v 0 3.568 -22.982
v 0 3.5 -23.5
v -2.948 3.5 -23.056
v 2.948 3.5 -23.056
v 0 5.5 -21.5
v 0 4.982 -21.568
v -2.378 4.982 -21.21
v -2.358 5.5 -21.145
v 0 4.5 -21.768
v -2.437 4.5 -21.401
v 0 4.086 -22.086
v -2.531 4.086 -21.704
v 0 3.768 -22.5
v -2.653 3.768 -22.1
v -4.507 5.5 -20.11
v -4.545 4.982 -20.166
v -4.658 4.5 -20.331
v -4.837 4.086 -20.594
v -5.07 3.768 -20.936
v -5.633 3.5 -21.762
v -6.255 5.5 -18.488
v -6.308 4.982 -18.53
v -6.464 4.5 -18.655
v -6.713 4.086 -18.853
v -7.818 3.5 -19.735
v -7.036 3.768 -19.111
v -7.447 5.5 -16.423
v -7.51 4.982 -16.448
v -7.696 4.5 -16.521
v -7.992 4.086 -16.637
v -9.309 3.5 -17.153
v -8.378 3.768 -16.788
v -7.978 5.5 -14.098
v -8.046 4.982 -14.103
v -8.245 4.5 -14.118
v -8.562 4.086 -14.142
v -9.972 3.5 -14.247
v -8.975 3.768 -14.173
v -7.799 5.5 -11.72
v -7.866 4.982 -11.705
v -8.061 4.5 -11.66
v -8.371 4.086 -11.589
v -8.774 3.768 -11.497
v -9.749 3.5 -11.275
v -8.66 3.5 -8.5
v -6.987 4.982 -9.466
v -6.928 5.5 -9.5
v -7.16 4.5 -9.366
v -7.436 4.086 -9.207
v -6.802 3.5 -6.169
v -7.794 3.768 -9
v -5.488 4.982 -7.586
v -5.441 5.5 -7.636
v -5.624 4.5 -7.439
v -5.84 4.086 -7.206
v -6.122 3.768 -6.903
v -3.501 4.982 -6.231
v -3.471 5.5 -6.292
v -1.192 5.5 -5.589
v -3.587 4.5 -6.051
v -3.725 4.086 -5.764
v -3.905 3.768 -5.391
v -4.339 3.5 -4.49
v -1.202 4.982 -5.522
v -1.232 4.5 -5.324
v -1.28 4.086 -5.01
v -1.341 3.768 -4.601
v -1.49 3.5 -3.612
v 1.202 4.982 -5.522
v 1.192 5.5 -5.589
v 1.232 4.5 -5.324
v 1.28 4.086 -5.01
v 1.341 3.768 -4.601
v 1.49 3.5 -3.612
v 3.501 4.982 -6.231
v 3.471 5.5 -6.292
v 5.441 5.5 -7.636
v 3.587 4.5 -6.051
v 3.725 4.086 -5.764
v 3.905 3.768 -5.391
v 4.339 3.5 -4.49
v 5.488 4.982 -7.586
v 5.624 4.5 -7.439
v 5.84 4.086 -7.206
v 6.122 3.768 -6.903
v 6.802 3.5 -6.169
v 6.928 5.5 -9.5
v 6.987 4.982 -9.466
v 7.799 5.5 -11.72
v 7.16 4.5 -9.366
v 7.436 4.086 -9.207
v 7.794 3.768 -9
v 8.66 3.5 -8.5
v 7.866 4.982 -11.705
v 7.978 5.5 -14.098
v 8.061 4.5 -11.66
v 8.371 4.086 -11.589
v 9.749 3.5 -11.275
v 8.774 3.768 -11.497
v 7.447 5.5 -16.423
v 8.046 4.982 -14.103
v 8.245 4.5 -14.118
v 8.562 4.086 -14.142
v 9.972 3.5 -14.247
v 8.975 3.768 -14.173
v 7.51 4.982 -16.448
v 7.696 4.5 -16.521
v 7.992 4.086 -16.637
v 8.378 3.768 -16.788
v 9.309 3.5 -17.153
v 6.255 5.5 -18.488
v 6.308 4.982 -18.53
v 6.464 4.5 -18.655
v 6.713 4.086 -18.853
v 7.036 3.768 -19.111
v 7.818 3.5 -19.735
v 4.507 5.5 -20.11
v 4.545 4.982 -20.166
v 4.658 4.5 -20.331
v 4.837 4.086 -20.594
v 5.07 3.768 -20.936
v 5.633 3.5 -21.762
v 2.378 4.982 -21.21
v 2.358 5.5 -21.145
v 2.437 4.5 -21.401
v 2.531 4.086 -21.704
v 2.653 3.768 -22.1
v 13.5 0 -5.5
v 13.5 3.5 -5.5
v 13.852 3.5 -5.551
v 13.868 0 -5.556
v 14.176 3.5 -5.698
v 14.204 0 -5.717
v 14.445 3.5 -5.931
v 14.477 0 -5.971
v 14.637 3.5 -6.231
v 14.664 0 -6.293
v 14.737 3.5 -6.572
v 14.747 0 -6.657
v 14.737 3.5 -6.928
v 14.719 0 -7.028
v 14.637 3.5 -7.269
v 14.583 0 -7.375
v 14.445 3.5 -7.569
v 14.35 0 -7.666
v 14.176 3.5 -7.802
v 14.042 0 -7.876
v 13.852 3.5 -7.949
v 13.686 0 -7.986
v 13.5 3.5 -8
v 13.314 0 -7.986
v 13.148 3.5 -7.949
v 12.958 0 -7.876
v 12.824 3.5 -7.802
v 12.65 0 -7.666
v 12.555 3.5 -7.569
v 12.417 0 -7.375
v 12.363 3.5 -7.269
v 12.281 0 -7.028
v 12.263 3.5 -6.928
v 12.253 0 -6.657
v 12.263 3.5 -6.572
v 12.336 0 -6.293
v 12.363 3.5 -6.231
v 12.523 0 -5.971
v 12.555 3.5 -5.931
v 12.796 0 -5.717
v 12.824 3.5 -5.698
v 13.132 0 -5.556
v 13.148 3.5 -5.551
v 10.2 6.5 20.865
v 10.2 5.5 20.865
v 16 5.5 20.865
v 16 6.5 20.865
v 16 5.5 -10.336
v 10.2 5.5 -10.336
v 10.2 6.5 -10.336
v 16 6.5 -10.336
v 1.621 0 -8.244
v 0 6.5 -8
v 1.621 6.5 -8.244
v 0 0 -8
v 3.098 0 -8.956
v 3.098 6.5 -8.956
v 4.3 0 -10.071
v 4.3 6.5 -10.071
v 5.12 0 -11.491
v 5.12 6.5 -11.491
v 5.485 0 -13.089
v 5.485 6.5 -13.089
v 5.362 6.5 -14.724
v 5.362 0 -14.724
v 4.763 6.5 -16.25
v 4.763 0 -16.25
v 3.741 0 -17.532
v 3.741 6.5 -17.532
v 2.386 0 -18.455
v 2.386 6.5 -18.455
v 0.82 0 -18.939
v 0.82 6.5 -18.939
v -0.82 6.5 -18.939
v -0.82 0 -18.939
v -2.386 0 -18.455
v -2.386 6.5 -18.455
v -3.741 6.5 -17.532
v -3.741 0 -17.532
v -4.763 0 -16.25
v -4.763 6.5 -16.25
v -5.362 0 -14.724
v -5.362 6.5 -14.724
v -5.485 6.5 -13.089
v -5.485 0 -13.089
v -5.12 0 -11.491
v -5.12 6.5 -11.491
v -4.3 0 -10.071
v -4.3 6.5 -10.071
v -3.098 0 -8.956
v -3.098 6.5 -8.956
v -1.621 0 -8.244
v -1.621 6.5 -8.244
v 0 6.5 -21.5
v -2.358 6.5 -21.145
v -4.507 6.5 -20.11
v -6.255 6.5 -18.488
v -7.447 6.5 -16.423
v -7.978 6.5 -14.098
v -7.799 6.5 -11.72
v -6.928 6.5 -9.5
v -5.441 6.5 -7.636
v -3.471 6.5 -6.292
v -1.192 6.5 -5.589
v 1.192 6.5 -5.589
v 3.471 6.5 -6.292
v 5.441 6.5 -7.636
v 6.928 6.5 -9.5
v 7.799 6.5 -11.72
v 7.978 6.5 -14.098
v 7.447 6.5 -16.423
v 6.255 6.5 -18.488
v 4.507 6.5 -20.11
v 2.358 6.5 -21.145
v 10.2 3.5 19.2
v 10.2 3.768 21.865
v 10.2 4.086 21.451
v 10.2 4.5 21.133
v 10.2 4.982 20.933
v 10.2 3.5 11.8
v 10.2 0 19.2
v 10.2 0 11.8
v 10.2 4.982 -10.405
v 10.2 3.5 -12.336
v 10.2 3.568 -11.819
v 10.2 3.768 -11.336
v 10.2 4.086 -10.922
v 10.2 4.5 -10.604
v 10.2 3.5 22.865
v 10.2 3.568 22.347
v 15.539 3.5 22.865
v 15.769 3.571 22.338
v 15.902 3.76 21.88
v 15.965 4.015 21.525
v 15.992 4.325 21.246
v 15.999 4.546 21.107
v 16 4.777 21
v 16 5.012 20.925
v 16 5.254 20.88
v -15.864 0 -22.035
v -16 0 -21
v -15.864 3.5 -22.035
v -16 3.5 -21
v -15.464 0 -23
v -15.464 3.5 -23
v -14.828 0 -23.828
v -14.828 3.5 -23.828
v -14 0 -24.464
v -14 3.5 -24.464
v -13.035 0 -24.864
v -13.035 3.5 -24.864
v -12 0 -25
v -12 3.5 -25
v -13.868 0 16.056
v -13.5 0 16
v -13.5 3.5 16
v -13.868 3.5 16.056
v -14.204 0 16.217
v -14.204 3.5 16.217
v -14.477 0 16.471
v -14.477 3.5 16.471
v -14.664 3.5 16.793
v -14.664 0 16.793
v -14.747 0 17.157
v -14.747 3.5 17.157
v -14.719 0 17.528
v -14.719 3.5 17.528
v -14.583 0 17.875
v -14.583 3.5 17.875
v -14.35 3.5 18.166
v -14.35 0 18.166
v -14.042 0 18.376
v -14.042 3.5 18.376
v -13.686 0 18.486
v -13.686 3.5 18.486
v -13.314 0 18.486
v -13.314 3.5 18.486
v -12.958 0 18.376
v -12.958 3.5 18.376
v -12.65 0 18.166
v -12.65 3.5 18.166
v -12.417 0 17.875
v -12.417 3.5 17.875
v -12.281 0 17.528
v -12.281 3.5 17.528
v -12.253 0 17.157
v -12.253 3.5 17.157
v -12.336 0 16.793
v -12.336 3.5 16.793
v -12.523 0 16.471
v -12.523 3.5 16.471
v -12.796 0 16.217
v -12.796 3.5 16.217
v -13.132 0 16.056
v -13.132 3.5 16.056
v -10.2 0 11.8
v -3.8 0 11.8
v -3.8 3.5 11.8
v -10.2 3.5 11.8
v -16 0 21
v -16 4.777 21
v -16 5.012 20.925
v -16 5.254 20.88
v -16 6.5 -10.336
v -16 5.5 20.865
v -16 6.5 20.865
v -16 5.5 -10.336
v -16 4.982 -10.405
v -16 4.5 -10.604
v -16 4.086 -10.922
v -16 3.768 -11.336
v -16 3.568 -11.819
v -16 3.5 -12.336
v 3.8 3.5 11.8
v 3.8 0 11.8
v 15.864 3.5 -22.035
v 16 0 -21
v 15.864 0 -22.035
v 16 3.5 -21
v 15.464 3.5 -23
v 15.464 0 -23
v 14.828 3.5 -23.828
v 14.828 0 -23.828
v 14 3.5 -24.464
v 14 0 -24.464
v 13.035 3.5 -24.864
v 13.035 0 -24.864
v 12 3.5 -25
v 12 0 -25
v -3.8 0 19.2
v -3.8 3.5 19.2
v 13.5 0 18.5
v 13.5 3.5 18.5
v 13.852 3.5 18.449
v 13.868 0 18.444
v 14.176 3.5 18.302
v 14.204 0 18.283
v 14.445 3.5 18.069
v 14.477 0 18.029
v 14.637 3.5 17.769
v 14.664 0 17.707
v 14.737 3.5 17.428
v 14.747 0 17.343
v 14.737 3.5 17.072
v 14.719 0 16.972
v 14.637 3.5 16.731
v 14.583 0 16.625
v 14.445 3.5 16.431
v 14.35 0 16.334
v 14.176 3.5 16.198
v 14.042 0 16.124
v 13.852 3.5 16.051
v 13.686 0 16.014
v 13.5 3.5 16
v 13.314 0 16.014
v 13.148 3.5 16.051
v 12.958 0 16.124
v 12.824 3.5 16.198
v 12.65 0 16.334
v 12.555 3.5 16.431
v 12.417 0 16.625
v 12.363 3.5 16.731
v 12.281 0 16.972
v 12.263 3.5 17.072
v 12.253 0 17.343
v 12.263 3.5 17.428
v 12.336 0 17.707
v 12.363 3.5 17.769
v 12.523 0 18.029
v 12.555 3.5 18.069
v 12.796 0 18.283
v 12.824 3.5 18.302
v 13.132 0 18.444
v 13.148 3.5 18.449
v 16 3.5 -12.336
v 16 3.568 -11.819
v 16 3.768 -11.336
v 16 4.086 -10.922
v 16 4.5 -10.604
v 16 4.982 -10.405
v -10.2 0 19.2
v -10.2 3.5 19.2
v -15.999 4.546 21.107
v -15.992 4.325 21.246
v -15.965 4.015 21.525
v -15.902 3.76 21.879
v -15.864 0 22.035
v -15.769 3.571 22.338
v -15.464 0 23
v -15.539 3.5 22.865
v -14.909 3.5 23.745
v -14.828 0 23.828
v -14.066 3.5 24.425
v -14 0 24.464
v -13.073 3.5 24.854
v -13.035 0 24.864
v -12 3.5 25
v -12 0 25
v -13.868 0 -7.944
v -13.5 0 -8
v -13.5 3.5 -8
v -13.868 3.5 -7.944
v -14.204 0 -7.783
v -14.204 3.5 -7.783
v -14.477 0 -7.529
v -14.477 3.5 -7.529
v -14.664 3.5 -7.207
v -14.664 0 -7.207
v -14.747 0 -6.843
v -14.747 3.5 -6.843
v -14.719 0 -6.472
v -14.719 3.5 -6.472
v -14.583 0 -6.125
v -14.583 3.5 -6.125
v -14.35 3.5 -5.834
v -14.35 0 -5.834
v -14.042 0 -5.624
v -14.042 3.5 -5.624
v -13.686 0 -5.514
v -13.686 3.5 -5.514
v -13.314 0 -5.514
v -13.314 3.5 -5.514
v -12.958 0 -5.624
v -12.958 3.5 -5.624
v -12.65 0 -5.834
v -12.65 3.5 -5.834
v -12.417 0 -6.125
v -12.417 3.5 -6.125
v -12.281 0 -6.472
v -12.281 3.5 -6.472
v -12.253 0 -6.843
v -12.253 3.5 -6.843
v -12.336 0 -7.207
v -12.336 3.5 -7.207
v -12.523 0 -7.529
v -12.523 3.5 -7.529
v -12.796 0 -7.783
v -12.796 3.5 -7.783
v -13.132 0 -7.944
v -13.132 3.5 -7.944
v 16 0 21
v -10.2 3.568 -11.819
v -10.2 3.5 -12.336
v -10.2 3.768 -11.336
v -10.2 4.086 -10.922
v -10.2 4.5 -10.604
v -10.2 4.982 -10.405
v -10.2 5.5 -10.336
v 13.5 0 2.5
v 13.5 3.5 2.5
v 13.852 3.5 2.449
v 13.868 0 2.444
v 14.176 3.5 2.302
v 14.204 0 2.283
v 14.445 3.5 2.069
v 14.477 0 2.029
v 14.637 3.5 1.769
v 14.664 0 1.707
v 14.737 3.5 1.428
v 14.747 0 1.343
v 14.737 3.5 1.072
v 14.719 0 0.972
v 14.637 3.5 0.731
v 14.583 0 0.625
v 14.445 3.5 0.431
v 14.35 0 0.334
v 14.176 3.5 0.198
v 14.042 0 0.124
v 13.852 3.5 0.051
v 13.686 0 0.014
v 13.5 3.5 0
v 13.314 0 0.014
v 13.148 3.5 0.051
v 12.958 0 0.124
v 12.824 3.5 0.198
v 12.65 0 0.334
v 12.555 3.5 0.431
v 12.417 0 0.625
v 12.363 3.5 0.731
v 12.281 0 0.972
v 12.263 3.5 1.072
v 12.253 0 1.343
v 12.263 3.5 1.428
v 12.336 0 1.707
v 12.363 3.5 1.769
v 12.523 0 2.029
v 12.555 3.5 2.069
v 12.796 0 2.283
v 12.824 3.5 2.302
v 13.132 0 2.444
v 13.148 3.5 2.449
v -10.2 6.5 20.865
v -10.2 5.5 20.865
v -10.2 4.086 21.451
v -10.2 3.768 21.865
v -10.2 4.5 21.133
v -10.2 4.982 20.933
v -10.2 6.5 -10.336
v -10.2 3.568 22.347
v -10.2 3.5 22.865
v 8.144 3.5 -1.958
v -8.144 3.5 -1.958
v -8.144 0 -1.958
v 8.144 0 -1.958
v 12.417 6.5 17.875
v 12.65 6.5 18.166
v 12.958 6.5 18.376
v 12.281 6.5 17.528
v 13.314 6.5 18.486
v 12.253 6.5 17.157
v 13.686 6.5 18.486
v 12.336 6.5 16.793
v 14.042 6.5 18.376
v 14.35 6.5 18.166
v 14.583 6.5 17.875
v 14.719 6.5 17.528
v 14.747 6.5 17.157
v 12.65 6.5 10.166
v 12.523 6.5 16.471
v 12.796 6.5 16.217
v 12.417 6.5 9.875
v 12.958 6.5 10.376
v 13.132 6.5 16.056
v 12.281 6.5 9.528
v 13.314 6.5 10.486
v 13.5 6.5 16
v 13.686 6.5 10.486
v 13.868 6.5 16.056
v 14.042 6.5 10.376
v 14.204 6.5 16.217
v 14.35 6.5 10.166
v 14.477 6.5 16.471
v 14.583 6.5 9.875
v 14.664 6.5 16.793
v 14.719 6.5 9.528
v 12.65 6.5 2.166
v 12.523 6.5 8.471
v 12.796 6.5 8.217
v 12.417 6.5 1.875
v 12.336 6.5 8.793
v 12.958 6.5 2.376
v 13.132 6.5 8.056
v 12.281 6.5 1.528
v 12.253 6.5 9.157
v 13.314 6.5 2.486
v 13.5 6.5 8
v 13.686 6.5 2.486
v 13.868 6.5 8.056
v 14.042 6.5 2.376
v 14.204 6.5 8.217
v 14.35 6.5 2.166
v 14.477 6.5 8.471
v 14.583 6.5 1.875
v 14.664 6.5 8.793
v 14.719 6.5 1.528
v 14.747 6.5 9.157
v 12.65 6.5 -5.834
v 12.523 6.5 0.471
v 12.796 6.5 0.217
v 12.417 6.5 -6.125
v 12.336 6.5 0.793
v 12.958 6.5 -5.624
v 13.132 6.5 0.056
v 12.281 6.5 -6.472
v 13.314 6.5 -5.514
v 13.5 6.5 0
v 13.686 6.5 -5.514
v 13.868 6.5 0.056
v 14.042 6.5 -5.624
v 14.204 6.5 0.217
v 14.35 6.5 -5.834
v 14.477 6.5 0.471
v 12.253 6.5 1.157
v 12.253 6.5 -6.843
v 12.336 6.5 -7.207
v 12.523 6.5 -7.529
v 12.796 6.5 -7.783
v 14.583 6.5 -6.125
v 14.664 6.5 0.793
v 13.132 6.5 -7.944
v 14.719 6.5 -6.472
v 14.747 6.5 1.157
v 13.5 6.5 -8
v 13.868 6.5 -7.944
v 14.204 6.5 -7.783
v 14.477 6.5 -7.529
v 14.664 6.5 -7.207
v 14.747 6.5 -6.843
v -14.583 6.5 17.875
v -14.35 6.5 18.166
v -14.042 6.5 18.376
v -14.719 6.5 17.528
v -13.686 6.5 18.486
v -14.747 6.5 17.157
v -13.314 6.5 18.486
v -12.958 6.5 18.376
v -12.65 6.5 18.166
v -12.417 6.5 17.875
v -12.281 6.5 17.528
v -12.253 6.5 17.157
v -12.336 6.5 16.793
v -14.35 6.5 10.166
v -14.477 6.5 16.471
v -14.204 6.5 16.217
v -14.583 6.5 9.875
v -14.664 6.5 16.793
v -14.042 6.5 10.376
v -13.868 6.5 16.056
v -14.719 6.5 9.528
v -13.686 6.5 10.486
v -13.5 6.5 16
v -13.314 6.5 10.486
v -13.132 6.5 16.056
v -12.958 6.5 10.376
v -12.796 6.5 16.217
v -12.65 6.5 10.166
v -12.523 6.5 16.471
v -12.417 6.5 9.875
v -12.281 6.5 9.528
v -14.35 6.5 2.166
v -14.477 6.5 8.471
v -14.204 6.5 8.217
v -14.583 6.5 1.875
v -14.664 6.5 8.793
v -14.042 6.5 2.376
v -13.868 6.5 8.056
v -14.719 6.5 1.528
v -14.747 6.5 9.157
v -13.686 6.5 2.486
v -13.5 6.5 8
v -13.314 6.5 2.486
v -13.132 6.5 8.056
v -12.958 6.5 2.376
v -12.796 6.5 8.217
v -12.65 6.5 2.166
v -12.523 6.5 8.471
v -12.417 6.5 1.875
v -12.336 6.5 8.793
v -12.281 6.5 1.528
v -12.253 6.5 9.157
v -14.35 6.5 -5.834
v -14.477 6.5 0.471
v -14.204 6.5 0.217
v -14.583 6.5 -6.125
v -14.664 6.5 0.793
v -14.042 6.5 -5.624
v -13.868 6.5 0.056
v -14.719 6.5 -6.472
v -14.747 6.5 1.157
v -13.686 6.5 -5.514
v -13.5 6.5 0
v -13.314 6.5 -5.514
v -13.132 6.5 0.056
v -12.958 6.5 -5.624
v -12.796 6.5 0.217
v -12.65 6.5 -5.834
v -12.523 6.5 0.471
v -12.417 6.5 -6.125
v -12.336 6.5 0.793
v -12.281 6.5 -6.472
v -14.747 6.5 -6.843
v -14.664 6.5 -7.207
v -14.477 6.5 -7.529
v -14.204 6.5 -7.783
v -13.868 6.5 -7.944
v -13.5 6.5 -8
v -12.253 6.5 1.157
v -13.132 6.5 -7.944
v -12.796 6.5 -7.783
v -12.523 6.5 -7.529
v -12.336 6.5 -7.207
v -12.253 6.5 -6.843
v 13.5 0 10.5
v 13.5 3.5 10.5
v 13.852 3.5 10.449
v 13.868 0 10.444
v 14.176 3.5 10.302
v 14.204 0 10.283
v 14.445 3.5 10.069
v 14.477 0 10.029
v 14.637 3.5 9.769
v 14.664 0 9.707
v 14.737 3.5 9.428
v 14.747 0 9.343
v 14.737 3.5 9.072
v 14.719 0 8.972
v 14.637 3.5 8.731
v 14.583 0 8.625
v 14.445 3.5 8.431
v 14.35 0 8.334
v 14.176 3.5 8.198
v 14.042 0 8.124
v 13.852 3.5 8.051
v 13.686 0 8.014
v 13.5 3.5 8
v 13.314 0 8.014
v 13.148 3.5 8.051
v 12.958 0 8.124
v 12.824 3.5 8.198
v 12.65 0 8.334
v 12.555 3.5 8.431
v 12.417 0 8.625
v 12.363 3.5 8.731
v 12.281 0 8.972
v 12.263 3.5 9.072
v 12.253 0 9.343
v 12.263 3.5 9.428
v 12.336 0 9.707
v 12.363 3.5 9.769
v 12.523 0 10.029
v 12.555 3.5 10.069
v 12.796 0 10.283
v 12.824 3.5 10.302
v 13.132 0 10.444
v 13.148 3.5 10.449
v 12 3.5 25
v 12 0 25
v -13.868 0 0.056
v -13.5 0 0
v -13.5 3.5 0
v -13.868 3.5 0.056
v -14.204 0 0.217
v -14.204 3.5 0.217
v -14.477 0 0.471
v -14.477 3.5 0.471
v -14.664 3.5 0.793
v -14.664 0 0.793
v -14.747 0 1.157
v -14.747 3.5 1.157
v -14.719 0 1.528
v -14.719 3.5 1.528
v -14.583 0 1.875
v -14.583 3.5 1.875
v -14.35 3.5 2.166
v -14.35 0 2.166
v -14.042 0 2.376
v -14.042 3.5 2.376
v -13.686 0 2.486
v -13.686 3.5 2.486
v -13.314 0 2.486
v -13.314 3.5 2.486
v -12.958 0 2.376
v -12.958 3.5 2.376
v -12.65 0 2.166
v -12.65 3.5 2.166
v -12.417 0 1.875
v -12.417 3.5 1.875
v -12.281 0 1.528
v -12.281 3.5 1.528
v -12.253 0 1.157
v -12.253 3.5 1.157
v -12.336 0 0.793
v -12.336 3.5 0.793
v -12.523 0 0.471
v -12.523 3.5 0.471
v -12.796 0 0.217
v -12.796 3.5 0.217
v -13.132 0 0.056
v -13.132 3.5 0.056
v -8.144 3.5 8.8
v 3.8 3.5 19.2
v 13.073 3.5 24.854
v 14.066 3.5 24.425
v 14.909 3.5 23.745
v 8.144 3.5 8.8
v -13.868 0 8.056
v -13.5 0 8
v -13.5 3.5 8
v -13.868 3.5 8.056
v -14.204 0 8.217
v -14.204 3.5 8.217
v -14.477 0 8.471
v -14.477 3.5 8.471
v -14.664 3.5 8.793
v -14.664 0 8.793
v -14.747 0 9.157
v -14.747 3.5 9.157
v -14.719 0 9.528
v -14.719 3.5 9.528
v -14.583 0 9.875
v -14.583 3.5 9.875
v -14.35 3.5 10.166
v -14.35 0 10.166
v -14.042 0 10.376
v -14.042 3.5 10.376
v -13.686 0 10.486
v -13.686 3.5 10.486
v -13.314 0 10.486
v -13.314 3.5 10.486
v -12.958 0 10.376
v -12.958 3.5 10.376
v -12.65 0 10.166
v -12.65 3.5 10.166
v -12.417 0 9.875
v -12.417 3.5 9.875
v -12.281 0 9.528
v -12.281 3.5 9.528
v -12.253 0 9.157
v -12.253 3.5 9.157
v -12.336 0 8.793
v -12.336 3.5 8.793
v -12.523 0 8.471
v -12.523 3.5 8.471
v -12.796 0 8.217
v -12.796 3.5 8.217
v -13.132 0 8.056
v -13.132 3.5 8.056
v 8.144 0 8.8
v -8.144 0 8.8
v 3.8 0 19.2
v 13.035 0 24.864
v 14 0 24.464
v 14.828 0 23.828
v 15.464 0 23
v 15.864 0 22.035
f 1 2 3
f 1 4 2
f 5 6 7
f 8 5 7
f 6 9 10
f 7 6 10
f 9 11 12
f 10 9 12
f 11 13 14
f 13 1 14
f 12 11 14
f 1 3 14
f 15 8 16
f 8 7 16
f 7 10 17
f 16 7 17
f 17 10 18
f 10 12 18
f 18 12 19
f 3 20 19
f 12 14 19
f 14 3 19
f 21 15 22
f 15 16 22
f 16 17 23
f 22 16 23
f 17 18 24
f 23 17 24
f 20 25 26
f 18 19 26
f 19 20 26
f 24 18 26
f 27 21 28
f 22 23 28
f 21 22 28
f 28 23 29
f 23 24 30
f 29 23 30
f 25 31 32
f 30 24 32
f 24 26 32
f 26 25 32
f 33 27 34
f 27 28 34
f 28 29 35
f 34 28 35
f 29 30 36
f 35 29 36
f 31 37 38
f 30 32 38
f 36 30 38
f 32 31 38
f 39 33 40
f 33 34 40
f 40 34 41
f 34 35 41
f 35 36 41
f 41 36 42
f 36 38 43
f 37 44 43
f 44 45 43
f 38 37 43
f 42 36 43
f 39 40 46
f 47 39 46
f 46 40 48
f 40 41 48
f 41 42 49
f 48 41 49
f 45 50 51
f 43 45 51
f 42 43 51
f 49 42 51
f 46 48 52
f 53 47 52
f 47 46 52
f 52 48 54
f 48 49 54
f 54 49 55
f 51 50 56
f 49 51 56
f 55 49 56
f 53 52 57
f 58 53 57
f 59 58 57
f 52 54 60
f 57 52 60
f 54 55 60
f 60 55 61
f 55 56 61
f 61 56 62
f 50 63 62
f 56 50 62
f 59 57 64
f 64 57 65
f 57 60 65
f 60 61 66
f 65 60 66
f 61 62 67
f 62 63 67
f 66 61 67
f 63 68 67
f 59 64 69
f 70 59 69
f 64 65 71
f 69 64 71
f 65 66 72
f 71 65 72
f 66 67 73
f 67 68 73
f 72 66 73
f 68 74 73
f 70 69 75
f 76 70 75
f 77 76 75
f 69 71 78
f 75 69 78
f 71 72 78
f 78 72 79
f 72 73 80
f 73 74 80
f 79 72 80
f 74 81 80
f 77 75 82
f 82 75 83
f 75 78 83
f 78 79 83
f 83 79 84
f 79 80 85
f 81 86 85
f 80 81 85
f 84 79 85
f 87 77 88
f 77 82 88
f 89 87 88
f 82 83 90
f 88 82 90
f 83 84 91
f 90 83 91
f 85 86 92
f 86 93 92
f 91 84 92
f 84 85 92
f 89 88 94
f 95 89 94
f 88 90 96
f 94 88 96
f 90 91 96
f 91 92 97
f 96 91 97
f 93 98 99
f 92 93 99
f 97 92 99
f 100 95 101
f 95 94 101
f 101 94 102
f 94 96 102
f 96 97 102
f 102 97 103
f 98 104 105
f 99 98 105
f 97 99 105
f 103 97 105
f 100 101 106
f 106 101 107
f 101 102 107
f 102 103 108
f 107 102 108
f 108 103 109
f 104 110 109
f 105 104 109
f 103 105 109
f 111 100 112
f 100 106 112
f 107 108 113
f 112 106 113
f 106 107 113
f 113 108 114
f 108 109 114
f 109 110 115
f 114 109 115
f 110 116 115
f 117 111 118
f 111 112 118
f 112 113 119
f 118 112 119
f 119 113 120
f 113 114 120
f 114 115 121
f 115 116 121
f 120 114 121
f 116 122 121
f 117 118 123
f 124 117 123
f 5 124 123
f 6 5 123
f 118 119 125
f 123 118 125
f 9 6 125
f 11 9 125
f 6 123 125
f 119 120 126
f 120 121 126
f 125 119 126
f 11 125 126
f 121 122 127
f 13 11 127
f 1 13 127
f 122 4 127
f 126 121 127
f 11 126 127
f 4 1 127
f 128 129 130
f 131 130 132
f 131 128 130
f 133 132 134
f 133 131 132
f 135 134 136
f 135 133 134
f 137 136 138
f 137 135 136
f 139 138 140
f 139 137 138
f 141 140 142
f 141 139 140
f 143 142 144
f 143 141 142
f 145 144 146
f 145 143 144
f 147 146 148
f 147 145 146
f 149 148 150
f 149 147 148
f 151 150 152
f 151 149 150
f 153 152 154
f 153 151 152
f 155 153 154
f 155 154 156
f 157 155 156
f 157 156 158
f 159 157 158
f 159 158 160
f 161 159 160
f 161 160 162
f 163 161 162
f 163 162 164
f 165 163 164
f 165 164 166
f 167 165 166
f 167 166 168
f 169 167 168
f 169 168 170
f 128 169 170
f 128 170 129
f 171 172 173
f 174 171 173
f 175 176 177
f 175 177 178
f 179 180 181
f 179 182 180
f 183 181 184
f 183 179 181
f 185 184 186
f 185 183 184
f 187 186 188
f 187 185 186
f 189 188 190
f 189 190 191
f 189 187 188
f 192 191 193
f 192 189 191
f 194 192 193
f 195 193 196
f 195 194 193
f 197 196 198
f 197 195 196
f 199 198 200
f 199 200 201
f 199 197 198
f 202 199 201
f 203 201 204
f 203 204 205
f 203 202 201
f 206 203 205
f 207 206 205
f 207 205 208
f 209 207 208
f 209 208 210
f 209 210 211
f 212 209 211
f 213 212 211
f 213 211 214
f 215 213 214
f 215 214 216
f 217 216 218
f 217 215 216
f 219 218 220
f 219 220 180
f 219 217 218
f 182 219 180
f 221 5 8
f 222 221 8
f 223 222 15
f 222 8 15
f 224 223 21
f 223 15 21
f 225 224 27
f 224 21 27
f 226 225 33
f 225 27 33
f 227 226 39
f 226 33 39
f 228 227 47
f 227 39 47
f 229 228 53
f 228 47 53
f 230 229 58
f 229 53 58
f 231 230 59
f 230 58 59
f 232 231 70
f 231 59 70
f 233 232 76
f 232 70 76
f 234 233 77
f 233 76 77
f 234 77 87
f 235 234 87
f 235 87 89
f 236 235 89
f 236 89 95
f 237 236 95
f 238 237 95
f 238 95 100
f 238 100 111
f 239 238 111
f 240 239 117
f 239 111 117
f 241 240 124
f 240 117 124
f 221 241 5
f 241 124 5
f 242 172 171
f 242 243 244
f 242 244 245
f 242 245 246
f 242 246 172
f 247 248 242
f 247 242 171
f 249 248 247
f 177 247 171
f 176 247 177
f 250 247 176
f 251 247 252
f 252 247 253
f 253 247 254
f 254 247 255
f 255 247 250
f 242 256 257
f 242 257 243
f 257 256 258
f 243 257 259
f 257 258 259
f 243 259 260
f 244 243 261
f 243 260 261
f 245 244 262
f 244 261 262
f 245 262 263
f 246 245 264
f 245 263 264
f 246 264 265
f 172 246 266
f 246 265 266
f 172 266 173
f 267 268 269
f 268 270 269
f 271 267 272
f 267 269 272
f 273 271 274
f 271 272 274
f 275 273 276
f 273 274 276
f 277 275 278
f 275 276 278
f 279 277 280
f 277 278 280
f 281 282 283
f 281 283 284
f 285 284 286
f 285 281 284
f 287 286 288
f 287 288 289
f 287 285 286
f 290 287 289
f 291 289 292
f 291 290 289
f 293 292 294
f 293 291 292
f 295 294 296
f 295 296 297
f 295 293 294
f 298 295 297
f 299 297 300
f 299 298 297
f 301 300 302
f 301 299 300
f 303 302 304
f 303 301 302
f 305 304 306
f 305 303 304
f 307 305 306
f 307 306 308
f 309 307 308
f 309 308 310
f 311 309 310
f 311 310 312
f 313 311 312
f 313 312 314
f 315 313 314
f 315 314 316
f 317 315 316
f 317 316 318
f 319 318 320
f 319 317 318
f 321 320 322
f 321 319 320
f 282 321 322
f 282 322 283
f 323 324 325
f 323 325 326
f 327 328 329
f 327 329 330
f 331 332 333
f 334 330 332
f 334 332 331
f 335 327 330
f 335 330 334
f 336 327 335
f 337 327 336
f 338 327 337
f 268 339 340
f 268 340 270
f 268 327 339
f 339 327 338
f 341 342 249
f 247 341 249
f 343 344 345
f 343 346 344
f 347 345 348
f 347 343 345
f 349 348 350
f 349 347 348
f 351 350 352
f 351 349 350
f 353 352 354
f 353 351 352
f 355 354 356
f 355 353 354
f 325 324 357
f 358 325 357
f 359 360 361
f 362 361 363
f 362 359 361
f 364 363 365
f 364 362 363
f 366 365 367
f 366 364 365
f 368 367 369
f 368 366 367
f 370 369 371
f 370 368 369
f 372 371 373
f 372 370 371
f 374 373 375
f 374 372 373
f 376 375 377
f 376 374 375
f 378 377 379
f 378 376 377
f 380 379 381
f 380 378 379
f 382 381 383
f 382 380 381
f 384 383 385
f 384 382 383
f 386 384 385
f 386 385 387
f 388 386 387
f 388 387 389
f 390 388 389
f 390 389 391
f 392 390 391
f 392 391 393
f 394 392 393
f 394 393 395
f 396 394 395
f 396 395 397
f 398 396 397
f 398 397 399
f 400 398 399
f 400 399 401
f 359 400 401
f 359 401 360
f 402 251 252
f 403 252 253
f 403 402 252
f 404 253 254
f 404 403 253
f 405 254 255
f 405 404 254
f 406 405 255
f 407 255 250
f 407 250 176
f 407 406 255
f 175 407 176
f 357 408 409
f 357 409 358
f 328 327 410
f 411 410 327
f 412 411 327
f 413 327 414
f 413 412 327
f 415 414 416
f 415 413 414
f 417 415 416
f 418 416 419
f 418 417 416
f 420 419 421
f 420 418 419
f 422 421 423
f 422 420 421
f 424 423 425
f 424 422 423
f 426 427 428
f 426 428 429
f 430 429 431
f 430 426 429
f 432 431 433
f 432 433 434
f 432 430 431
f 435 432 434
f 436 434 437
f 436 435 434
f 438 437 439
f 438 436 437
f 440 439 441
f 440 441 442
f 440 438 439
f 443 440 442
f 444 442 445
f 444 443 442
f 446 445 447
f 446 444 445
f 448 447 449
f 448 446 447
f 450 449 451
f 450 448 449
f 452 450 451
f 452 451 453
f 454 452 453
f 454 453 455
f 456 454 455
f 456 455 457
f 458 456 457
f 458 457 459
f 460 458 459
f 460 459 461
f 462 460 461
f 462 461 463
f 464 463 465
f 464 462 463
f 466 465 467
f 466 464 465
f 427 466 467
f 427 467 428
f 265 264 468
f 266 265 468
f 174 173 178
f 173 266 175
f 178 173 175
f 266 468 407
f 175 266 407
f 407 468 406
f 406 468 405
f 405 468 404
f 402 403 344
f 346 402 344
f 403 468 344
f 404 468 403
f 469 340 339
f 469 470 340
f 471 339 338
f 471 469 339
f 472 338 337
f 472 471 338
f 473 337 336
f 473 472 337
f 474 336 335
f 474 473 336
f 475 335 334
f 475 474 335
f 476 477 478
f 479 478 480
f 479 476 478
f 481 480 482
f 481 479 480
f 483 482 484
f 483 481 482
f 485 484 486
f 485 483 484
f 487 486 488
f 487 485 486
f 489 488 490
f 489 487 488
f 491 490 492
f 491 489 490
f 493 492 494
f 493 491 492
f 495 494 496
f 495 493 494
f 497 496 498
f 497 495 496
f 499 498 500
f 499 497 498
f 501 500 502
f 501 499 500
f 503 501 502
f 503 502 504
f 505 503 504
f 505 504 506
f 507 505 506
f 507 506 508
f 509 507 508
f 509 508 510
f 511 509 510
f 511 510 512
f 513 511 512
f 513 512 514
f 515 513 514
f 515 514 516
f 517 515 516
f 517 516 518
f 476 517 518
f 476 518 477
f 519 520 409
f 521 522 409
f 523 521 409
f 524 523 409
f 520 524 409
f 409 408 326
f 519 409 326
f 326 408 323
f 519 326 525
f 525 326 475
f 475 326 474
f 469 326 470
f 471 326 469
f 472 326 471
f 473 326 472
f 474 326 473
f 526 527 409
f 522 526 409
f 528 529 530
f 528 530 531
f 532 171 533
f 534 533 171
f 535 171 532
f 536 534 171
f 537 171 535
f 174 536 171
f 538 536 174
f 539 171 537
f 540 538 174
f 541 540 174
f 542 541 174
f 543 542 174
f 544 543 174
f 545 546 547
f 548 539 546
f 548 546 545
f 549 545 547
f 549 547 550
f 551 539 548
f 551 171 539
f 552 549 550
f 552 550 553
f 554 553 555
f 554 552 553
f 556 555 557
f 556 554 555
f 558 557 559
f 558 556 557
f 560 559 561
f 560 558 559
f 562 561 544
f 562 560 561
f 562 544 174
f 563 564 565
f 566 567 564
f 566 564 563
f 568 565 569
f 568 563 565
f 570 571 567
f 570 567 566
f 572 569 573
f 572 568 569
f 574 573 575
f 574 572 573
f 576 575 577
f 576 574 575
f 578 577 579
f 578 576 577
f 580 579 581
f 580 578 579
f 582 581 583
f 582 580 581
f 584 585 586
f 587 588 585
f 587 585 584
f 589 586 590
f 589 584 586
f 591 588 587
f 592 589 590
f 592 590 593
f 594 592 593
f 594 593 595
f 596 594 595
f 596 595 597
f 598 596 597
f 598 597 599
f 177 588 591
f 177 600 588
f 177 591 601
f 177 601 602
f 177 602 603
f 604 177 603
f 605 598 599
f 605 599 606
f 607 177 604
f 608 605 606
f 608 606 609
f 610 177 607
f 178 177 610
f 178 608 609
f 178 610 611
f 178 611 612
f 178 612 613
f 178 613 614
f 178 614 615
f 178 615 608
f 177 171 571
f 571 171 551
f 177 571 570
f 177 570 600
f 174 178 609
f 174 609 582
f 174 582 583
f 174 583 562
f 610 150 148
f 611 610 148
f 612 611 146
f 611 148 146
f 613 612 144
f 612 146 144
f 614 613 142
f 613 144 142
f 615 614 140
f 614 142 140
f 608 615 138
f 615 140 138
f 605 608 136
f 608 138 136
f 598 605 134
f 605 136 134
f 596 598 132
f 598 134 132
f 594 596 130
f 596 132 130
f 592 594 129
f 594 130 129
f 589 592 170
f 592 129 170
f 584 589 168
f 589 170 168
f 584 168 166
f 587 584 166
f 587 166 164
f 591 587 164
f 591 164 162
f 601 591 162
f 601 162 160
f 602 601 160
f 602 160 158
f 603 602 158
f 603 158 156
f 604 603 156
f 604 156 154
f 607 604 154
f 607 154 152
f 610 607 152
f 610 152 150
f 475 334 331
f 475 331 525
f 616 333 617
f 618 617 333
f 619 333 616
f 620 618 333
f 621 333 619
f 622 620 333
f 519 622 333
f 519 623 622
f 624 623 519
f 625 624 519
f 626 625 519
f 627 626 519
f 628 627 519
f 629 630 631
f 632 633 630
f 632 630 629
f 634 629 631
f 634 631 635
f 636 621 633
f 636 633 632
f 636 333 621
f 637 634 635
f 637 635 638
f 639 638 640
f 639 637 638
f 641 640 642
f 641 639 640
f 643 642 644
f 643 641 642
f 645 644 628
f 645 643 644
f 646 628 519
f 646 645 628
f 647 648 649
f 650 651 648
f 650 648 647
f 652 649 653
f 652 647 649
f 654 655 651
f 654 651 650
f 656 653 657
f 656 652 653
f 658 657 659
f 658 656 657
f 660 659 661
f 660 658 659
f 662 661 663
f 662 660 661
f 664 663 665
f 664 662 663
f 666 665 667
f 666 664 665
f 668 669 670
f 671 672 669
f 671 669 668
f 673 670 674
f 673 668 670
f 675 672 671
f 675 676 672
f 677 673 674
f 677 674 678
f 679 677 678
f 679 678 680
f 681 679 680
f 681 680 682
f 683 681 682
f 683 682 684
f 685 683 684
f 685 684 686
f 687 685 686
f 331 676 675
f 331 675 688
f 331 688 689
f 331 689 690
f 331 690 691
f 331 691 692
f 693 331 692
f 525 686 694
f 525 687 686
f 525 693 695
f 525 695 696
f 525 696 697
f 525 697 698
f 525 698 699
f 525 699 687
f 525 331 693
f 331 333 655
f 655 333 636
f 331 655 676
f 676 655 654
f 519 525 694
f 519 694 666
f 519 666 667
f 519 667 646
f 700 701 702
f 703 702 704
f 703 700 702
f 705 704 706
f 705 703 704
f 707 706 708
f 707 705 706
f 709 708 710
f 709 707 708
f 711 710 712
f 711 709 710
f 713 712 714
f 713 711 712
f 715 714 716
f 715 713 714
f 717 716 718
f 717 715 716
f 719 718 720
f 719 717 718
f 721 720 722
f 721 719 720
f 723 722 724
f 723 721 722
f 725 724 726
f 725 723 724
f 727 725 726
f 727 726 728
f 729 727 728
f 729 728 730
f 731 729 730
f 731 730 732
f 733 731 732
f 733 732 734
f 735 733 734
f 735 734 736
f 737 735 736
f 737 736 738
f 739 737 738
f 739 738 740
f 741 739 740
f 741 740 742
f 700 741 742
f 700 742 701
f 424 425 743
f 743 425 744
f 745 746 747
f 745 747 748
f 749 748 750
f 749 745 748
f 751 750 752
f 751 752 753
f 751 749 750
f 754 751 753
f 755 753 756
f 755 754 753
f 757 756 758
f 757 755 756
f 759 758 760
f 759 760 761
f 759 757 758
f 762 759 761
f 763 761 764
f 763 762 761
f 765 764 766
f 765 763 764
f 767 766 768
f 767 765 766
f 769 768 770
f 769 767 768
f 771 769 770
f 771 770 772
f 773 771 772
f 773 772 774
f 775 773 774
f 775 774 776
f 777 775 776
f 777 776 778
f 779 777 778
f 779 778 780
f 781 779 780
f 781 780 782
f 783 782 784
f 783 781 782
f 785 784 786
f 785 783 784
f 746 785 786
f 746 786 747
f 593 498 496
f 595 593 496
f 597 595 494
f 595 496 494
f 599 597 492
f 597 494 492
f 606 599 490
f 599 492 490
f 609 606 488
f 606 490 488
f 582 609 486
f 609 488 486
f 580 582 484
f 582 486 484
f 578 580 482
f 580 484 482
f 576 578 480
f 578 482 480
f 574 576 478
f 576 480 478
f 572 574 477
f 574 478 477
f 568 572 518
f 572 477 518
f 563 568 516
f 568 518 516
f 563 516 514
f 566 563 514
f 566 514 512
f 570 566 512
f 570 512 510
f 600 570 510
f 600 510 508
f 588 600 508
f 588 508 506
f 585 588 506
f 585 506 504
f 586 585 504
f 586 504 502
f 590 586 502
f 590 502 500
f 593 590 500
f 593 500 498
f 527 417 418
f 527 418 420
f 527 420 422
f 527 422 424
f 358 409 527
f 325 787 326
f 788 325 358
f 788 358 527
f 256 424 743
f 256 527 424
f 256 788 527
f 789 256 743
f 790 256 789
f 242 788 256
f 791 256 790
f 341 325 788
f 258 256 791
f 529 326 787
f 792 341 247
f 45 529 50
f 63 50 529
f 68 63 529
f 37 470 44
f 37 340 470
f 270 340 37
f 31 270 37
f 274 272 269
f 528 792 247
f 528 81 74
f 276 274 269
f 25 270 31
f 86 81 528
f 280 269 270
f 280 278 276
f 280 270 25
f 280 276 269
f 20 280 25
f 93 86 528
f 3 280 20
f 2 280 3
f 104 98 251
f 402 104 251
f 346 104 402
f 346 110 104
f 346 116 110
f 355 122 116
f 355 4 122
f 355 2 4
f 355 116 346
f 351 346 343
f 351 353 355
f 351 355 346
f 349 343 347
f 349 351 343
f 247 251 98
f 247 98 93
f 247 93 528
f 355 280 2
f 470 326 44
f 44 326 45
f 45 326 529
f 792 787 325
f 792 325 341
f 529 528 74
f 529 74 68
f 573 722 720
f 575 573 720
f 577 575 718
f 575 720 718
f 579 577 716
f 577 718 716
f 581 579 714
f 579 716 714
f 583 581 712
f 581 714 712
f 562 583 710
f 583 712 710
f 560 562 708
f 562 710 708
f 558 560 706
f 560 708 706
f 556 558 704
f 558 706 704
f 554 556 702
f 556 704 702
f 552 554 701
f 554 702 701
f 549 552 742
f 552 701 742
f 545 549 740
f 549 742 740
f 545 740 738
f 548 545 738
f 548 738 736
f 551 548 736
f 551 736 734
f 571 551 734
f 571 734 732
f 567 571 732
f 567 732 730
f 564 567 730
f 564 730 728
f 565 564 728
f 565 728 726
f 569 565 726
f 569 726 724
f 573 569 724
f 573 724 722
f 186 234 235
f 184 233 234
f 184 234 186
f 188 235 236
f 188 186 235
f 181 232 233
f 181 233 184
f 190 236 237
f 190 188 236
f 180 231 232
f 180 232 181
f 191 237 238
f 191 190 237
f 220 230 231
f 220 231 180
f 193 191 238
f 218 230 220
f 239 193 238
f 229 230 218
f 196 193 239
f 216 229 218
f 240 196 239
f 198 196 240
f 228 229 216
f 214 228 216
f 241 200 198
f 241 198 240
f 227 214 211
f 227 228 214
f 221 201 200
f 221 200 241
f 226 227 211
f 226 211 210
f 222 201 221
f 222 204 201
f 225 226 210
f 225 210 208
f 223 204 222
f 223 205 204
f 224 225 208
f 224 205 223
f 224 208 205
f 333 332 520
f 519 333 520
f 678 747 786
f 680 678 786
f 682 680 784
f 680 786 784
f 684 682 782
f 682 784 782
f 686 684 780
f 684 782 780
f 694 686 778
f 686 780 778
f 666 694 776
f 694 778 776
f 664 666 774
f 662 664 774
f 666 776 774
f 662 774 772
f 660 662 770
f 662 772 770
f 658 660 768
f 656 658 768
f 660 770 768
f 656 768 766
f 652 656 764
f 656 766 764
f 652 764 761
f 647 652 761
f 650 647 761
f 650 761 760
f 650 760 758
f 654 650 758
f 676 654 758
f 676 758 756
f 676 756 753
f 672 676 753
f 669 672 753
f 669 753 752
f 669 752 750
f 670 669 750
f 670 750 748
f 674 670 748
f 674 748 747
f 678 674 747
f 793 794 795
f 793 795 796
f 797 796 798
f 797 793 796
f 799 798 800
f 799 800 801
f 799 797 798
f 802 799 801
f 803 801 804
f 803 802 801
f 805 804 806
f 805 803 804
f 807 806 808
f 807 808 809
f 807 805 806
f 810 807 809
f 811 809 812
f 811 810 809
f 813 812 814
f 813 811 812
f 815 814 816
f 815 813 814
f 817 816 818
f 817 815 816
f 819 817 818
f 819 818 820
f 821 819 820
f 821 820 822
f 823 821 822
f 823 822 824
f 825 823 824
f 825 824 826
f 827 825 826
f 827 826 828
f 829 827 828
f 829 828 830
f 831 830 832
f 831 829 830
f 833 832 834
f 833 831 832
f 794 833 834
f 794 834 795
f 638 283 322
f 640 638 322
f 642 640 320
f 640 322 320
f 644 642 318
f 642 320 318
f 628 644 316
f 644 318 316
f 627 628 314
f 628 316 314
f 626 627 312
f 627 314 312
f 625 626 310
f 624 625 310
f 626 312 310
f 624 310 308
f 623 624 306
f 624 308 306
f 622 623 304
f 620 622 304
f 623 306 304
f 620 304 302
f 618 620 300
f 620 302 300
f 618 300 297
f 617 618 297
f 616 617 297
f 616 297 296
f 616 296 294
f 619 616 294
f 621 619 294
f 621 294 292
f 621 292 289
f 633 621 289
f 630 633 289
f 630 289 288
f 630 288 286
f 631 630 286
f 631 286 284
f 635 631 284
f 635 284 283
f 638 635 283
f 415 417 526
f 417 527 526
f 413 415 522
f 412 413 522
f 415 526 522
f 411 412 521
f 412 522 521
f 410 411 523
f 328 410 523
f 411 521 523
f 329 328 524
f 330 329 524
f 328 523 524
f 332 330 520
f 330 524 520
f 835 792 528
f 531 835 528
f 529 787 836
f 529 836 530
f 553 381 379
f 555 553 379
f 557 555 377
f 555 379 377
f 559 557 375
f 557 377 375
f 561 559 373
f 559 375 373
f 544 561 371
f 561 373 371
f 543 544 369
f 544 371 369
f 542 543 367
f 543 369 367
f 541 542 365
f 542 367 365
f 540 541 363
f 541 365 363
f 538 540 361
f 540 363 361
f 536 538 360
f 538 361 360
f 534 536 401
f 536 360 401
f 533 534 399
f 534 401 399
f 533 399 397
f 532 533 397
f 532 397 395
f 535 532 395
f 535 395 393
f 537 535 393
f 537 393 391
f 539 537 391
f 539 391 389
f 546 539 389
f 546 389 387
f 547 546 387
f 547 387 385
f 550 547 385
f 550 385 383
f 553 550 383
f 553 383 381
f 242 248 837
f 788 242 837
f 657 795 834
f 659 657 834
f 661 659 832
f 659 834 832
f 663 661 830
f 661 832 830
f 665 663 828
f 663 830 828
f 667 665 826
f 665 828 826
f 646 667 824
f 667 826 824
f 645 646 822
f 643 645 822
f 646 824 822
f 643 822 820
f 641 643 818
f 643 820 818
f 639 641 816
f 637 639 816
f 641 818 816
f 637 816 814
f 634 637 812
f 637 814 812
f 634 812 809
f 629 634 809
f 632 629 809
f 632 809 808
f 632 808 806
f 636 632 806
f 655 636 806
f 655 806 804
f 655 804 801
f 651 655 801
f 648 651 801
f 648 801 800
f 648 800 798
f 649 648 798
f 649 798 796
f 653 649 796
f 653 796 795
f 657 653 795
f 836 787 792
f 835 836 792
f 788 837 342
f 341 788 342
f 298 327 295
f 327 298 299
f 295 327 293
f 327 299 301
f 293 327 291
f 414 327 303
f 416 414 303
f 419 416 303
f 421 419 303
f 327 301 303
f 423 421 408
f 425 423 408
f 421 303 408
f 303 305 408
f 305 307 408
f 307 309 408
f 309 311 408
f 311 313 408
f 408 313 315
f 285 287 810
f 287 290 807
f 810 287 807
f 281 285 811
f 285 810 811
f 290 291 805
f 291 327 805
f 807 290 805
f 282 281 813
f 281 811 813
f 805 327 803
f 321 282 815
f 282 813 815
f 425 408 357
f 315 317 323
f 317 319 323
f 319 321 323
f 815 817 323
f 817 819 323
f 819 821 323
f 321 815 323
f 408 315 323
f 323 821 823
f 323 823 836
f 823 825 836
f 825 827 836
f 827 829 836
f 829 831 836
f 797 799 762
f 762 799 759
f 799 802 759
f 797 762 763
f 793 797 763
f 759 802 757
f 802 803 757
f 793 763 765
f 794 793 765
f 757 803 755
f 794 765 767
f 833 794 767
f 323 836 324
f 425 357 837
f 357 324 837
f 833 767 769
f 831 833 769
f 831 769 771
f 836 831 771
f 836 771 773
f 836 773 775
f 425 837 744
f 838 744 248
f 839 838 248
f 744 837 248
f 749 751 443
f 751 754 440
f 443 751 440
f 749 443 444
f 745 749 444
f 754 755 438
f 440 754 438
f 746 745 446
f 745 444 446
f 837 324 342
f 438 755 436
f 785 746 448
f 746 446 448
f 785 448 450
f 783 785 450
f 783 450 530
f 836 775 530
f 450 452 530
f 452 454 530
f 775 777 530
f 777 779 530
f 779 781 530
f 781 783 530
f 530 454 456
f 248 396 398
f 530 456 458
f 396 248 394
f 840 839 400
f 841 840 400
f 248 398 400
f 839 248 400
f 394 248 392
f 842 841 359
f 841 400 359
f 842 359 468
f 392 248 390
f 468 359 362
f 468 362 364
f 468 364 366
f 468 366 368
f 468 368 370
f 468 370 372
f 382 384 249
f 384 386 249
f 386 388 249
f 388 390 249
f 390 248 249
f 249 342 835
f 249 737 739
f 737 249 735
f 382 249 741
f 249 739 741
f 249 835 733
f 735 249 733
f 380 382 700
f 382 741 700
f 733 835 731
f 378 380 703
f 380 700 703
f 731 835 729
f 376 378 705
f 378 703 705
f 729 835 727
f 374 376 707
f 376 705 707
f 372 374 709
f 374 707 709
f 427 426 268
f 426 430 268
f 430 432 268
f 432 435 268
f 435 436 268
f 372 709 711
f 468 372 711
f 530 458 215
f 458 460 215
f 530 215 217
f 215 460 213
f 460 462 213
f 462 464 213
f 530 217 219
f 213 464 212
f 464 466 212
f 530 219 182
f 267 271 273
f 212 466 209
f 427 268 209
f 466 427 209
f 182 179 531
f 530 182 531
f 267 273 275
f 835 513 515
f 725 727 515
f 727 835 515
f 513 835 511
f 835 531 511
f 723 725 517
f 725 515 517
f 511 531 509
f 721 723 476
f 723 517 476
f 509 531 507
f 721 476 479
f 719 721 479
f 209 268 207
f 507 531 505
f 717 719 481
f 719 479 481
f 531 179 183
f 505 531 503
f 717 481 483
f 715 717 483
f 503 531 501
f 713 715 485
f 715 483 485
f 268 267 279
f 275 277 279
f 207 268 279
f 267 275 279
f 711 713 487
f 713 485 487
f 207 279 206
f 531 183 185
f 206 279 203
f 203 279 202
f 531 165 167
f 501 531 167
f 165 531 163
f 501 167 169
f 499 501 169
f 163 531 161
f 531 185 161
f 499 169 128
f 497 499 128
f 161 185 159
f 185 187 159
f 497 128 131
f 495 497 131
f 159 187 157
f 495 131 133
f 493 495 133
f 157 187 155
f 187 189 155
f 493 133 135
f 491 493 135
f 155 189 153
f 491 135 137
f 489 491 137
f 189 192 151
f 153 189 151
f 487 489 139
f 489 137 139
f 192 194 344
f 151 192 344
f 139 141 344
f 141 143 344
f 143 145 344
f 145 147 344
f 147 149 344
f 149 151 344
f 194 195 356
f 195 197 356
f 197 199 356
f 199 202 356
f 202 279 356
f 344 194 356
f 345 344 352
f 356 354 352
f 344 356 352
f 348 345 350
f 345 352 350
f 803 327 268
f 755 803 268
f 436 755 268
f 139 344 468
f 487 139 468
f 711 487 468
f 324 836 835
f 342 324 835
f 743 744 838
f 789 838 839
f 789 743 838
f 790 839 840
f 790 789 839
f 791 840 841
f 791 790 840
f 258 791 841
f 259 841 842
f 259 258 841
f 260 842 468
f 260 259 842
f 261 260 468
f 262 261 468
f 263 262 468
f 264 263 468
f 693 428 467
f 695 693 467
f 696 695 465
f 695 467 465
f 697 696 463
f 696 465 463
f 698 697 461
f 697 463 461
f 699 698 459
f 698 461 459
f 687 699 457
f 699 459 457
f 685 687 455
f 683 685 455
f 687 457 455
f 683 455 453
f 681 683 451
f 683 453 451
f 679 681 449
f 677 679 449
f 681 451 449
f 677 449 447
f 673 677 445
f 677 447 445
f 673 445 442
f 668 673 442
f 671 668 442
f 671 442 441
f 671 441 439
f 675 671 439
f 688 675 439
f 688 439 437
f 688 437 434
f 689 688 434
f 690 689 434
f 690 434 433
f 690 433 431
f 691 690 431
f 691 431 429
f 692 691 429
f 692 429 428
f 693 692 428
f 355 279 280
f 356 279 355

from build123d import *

# Parameters (mm, degrees)
SKETCH1_W                = 32
SKETCH1_H                = 50
SKETCH1_R                = 5.5
SKETCH1_R_2              = 1.25
BOSS_EXTRUDE1_DEPTH      = 3.5
FILETE1_R                = 4
ESBO_O1_R                = 8
ESBO_O1_R_2              = 5.5
ESBO_O1_W                = 5.8
ESBO_O1_H                = 31.201183342
RESSALTO_EXTRUS_O1_DEPTH = 3
ESBO_O3_W                = 16.288942458
ESBO_O3_H                = 10.757575704
CORTE_EXTRUS_O1_DEPTH    = 30.887288268
CORTE_EXTRUS_O2_REACH    = 32.385
ESBO_O4_R                = 1.25
FILETE2_R                = 2


with BuildPart() as part:
    # Sketch1 → Boss-Extrude1 (new body)
    with BuildSketch(Plane(origin=(0, 0, 0), x_dir=(1, 0, 0), z_dir=(0, 1, 0))):
        Rectangle(SKETCH1_W, SKETCH1_H)
        with Locations(Location((0, 13.5, 0), (0, 0, 270))):
            Circle(SKETCH1_R, mode=Mode.SUBTRACT)
        with Locations(Location((13.5, 6.75, 0), (0, 0, 270))):
            Circle(SKETCH1_R_2, mode=Mode.SUBTRACT)
        with Locations(Location((13.5, -1.25, 0), (0, 0, 270))):
            Circle(SKETCH1_R_2, mode=Mode.SUBTRACT)
        with Locations(Location((13.5, -9.25, 0), (0, 0, 270))):
            Circle(SKETCH1_R_2, mode=Mode.SUBTRACT)
        with Locations(Location((13.5, -17.25, 0), (0, 0, 270))):
            Circle(SKETCH1_R_2, mode=Mode.SUBTRACT)
        with Locations(Location((-13.5, -17.25, 0), (0, 0, 90))):
            Circle(SKETCH1_R_2, mode=Mode.SUBTRACT)
        with Locations(Location((-13.5, -9.25, 0), (0, 0, 90))):
            Circle(SKETCH1_R_2, mode=Mode.SUBTRACT)
        with Locations(Location((-13.5, -1.25, 0), (0, 0, 90))):
            Circle(SKETCH1_R_2, mode=Mode.SUBTRACT)
        with Locations(Location((-13.5, 6.75, 0), (0, 0, 90))):
            Circle(SKETCH1_R_2, mode=Mode.SUBTRACT)
        Polygon((3.8, -15.5), (3.8, -11.8), (10.2, -11.8), (10.2, -19.2), (3.8, -19.2), align=None, mode=Mode.SUBTRACT)
        Polygon((-10.2, -19.2), (-3.8, -19.2), (-3.8, -15.5), (-3.8, -11.8), (-10.2, -11.8), align=None, mode=Mode.SUBTRACT)
    extrude(amount=BOSS_EXTRUDE1_DEPTH)

    # Filete1
    filete1_edges = [part.edges().sort_by_distance(p)[0] for p in [
        (16, 1.75, 25),
        (-16, 1.75, 25),
        (-16, 1.75, -25),
        (16, 1.75, -25),
    ]]
    fillet(filete1_edges, radius=FILETE1_R)

    # Esboço1 → Ressalto-extrusão1 (add)
    # profile 1 of 3: a face of its own
    with BuildSketch(Plane(origin=(0, 3.5, 0), x_dir=(1, 0, 0), z_dir=(0, 1, 0))):
        with Locations(Location((0, 13.5, 0), (0, 0, 90))):
            Circle(ESBO_O1_R)
        with Locations(Location((0, 13.5, 0), (0, 0, 270))):
            Circle(ESBO_O1_R_2, mode=Mode.SUBTRACT)
    # profile 2 of 3: a face of its own
    with BuildSketch(Plane(origin=(0, 3.5, 0), x_dir=(1, 0, 0), z_dir=(0, 1, 0))):
        with Locations((-13.1, -5.264208671)):
            Rectangle(ESBO_O1_W, ESBO_O1_H)
    # profile 3 of 3: a face of its own
    with BuildSketch(Plane(origin=(0, 3.5, 0), x_dir=(1, 0, 0), z_dir=(0, 1, 0))):
        with Locations((13.1, -5.264208671)):
            Rectangle(ESBO_O1_W, ESBO_O1_H)
    extrude(amount=RESSALTO_EXTRUS_O1_DEPTH)

    # Esboço3 → Corte-extrusão1 (cut, through all)
    with BuildSketch(Plane(origin=(0, 3.5, 0), x_dir=(1, 0, 0), z_dir=(0, 1, 0))):
        with Locations((0, -3.421212148)):
            Rectangle(ESBO_O3_W, ESBO_O3_H)
    extrude(amount=-CORTE_EXTRUS_O1_DEPTH, mode=Mode.SUBTRACT)

    # Esboço4 → Corte-extrusão2 (cut, up to next)
    with BuildSketch(Plane.XZ, mode=Mode.PRIVATE) as corte_extrus_o2_sk1:
        with Locations(Location((-13.5, 17.25, 0), (0, 0, 270))):
            Circle(ESBO_O4_R)
    corte_extrus_o2_tool1 = extrude(corte_extrus_o2_sk1.sketch, amount=-CORTE_EXTRUS_O2_REACH, mode=Mode.PRIVATE) & part.part
    # Esboço4 → Corte-extrusão2 (cut, up to next)
    with BuildSketch(Plane.XZ, mode=Mode.PRIVATE) as corte_extrus_o2_sk2:
        with Locations(Location((-13.5, 9.25, 0), (0, 0, 270))):
            Circle(ESBO_O4_R)
    corte_extrus_o2_tool2 = extrude(corte_extrus_o2_sk2.sketch, amount=-CORTE_EXTRUS_O2_REACH, mode=Mode.PRIVATE) & part.part
    # Esboço4 → Corte-extrusão2 (cut, up to next)
    with BuildSketch(Plane.XZ, mode=Mode.PRIVATE) as corte_extrus_o2_sk3:
        with Locations(Location((-13.5, 1.25, 0), (0, 0, 270))):
            Circle(ESBO_O4_R)
    corte_extrus_o2_tool3 = extrude(corte_extrus_o2_sk3.sketch, amount=-CORTE_EXTRUS_O2_REACH, mode=Mode.PRIVATE) & part.part
    # Esboço4 → Corte-extrusão2 (cut, up to next)
    with BuildSketch(Plane.XZ, mode=Mode.PRIVATE) as corte_extrus_o2_sk4:
        with Locations(Location((-13.5, -6.75, 0), (0, 0, 270))):
            Circle(ESBO_O4_R)
    corte_extrus_o2_tool4 = extrude(corte_extrus_o2_sk4.sketch, amount=-CORTE_EXTRUS_O2_REACH, mode=Mode.PRIVATE) & part.part
    # Esboço4 → Corte-extrusão2 (cut, up to next)
    with BuildSketch(Plane.XZ, mode=Mode.PRIVATE) as corte_extrus_o2_sk5:
        with Locations(Location((13.5, 1.25, 0), (0, 0, 270))):
            Circle(ESBO_O4_R)
    corte_extrus_o2_tool5 = extrude(corte_extrus_o2_sk5.sketch, amount=-CORTE_EXTRUS_O2_REACH, mode=Mode.PRIVATE) & part.part
    # Esboço4 → Corte-extrusão2 (cut, up to next)
    with BuildSketch(Plane.XZ, mode=Mode.PRIVATE) as corte_extrus_o2_sk6:
        with Locations(Location((13.5, 9.25, 0), (0, 0, 270))):
            Circle(ESBO_O4_R)
    corte_extrus_o2_tool6 = extrude(corte_extrus_o2_sk6.sketch, amount=-CORTE_EXTRUS_O2_REACH, mode=Mode.PRIVATE) & part.part
    # Esboço4 → Corte-extrusão2 (cut, up to next)
    with BuildSketch(Plane.XZ, mode=Mode.PRIVATE) as corte_extrus_o2_sk7:
        with Locations(Location((13.5, 17.25, 0), (0, 0, 270))):
            Circle(ESBO_O4_R)
    corte_extrus_o2_tool7 = extrude(corte_extrus_o2_sk7.sketch, amount=-CORTE_EXTRUS_O2_REACH, mode=Mode.PRIVATE) & part.part
    # Esboço4 → Corte-extrusão2 (cut, up to next)
    with BuildSketch(Plane.XZ, mode=Mode.PRIVATE) as corte_extrus_o2_sk8:
        with Locations(Location((13.5, -6.75, 0), (0, 0, 270))):
            Circle(ESBO_O4_R)
    corte_extrus_o2_tool8 = extrude(corte_extrus_o2_sk8.sketch, amount=-CORTE_EXTRUS_O2_REACH, mode=Mode.PRIVATE) & part.part
    add(corte_extrus_o2_tool1.solids().sort_by_distance((-13.5, 0, 17.25))[0], mode=Mode.SUBTRACT)
    add(corte_extrus_o2_tool2.solids().sort_by_distance((-13.5, 0, 9.25))[0], mode=Mode.SUBTRACT)
    add(corte_extrus_o2_tool3.solids().sort_by_distance((-13.5, 0, 1.25))[0], mode=Mode.SUBTRACT)
    add(corte_extrus_o2_tool4.solids().sort_by_distance((-13.5, 0, -6.75))[0], mode=Mode.SUBTRACT)
    add(corte_extrus_o2_tool5.solids().sort_by_distance((13.5, 0, 1.25))[0], mode=Mode.SUBTRACT)
    add(corte_extrus_o2_tool6.solids().sort_by_distance((13.5, 0, 9.25))[0], mode=Mode.SUBTRACT)
    add(corte_extrus_o2_tool7.solids().sort_by_distance((13.5, 0, 17.25))[0], mode=Mode.SUBTRACT)
    add(corte_extrus_o2_tool8.solids().sort_by_distance((13.5, 0, -6.75))[0], mode=Mode.SUBTRACT)

    # Filete2
    filete2_edges = [part.edges().sort_by_distance(p)[0] for p in [
        (-13.1, 3.5, 20.864800342),
        (-13.1, 3.5, -10.336383),
        (13.1, 3.5, -10.336383),
        (13.1, 3.5, 20.864800342),
        (0, 3.5, -5.5),
    ]]
    fillet(filete2_edges, radius=FILETE2_R)


solid = part.part
